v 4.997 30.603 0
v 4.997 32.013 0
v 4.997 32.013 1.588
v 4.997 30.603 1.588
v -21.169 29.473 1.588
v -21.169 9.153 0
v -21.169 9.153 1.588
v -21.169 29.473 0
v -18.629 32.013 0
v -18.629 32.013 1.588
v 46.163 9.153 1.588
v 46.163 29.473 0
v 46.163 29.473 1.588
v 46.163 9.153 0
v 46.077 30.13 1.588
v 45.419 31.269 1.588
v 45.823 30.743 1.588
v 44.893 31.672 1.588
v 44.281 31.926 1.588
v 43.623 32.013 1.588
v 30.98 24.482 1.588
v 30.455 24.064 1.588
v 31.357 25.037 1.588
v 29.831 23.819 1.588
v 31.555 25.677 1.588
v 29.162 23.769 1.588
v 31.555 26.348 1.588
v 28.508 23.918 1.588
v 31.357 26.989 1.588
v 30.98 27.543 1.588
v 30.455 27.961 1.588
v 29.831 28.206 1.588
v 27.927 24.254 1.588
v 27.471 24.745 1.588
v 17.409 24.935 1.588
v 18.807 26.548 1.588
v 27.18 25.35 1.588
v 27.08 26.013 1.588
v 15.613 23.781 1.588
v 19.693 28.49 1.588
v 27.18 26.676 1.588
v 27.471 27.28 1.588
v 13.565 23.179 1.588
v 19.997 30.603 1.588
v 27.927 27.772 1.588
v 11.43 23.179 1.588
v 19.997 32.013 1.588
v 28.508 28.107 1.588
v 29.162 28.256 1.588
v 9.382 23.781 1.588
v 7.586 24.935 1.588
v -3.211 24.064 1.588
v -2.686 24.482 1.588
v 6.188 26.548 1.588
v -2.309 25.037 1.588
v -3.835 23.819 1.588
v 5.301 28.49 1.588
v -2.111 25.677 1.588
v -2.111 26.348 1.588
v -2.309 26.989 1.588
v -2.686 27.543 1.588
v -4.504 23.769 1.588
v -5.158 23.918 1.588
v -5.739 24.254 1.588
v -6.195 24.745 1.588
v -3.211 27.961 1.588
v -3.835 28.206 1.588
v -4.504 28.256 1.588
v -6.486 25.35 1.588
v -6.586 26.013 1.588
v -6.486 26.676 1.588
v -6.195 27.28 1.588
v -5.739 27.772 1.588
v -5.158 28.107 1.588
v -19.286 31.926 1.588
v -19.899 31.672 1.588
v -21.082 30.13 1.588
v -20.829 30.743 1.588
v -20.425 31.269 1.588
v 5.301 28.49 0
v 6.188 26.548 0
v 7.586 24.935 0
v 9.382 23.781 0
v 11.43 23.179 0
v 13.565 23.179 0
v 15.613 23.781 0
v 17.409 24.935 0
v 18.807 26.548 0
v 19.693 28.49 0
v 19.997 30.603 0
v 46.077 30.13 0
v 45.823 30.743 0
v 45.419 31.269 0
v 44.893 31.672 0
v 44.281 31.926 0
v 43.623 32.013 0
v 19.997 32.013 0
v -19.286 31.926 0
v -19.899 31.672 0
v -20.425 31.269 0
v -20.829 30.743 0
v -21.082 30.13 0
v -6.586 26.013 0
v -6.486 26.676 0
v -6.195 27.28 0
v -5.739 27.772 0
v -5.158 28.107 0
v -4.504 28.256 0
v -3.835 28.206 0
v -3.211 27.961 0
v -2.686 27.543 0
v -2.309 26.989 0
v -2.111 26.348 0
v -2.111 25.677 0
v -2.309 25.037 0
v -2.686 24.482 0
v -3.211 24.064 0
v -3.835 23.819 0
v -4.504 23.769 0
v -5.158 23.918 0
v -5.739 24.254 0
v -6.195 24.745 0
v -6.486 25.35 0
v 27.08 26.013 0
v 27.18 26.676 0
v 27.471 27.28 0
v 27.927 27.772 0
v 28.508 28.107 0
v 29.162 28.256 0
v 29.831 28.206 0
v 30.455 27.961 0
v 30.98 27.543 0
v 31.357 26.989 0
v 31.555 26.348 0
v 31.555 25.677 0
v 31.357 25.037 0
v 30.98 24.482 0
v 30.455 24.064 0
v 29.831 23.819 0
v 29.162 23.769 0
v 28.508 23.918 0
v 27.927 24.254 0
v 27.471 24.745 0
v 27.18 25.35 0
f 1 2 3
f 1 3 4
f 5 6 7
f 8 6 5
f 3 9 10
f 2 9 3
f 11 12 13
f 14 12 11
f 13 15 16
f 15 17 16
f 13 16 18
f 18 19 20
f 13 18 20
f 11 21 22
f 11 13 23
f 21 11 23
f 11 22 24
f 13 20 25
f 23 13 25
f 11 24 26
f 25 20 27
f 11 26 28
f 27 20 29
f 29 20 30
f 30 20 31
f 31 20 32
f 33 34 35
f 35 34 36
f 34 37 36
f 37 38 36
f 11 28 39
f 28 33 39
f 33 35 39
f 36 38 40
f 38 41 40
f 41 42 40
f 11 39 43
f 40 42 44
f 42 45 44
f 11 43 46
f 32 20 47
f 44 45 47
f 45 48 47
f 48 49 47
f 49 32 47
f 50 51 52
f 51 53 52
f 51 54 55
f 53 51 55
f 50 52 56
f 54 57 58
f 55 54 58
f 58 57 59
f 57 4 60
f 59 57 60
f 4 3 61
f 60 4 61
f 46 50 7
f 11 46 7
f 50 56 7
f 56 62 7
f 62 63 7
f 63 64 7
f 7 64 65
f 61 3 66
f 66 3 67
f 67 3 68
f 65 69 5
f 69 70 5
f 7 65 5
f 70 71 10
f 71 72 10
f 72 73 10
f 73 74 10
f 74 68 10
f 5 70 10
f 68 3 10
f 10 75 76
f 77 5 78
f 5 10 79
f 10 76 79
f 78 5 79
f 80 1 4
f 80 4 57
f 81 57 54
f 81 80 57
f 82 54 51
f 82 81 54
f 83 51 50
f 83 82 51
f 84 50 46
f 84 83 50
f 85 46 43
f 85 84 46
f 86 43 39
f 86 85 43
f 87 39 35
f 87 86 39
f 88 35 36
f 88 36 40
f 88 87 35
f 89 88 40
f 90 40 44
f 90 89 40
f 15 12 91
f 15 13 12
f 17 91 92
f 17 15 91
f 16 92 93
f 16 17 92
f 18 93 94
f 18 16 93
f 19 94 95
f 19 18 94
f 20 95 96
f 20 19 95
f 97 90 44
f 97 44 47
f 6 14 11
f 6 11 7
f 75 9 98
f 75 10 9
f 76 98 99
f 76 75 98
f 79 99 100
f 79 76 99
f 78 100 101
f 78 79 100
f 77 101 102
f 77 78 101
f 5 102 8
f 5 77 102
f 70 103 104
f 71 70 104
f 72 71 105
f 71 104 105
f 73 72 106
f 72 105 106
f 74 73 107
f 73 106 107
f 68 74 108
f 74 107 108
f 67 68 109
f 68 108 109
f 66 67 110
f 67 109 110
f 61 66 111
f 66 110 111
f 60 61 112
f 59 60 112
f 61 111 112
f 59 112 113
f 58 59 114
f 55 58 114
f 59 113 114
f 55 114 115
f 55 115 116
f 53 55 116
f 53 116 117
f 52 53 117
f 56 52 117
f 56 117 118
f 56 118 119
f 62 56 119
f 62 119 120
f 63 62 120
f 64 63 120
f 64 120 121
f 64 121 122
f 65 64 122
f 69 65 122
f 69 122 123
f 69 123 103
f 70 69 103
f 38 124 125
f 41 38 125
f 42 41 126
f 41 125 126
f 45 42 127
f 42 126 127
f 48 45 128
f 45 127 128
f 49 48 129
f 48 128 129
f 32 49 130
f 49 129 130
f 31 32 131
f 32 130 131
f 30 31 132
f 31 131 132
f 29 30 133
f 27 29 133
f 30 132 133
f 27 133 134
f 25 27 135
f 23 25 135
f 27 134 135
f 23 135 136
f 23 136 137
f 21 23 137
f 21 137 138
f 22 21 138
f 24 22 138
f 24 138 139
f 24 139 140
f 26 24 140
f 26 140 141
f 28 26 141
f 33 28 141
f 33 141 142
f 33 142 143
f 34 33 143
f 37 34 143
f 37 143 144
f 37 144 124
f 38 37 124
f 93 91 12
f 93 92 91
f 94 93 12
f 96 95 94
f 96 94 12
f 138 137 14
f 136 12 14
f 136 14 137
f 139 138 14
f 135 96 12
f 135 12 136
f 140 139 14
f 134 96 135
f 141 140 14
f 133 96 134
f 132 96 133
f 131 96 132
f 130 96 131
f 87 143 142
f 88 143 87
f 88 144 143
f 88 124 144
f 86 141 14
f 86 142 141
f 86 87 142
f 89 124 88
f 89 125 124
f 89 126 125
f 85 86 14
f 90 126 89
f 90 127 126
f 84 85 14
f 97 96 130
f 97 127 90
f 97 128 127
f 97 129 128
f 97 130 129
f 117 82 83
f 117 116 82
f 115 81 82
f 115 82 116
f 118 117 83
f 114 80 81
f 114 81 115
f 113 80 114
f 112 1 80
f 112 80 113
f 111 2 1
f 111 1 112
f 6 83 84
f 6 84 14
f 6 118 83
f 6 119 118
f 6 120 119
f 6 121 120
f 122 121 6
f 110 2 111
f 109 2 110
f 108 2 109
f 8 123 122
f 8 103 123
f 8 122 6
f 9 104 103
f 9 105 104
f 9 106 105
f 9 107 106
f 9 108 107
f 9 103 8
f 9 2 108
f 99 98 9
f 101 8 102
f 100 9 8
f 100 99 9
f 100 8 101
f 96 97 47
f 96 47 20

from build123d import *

# Parameters (mm, degrees)
BOSS_EXTRUDE1_DEPTH  = 1.5875
M4_CLEARANCE_HOLE1_D = 4.5
FILLET1_R            = 2.54


with BuildPart() as part:
    # Sketch1 → Boss-Extrude1 (new body)
    with BuildSketch(Plane.XY):
        with BuildLine():
            Line((4.9971849, 32.012776561), (-21.1688151, 32.012776561))
            Line((-21.1688151, 32.012776561), (-21.1688151, 9.152776561))
            Line((-21.1688151, 9.152776561), (46.1631849, 9.152776561))
            Line((46.1631849, 9.152776561), (46.1631849, 32.012776561))
            Line((46.1631849, 32.012776561), (19.9971849, 32.012776561))
            Line((19.9971849, 32.012776561), (19.9971849, 30.603076561))
            ThreePointArc((19.9971849, 30.603076561), (12.4971849, 23.103076561), (4.9971849, 30.603076561))
            Line((4.9971849, 30.603076561), (4.9971849, 32.012776561))
        make_face()
    extrude(amount=BOSS_EXTRUDE1_DEPTH)

    # M4 Clearance Hole1 (through all)
    with Locations(Plane.XY.offset(1.5875)):
        with Locations((-4.3358151, 26.012776561), (29.3301849, 26.012776561)):
            Hole(M4_CLEARANCE_HOLE1_D / 2)

    # Fillet1
    fillet1_edges = [part.edges().sort_by_distance(p)[0] for p in [
        (46.1631849, 32.012776561, 0.79375),
        (-21.1688151, 32.012776561, 0.79375),
    ]]
    fillet(fillet1_edges, radius=FILLET1_R)


solid = part.part
